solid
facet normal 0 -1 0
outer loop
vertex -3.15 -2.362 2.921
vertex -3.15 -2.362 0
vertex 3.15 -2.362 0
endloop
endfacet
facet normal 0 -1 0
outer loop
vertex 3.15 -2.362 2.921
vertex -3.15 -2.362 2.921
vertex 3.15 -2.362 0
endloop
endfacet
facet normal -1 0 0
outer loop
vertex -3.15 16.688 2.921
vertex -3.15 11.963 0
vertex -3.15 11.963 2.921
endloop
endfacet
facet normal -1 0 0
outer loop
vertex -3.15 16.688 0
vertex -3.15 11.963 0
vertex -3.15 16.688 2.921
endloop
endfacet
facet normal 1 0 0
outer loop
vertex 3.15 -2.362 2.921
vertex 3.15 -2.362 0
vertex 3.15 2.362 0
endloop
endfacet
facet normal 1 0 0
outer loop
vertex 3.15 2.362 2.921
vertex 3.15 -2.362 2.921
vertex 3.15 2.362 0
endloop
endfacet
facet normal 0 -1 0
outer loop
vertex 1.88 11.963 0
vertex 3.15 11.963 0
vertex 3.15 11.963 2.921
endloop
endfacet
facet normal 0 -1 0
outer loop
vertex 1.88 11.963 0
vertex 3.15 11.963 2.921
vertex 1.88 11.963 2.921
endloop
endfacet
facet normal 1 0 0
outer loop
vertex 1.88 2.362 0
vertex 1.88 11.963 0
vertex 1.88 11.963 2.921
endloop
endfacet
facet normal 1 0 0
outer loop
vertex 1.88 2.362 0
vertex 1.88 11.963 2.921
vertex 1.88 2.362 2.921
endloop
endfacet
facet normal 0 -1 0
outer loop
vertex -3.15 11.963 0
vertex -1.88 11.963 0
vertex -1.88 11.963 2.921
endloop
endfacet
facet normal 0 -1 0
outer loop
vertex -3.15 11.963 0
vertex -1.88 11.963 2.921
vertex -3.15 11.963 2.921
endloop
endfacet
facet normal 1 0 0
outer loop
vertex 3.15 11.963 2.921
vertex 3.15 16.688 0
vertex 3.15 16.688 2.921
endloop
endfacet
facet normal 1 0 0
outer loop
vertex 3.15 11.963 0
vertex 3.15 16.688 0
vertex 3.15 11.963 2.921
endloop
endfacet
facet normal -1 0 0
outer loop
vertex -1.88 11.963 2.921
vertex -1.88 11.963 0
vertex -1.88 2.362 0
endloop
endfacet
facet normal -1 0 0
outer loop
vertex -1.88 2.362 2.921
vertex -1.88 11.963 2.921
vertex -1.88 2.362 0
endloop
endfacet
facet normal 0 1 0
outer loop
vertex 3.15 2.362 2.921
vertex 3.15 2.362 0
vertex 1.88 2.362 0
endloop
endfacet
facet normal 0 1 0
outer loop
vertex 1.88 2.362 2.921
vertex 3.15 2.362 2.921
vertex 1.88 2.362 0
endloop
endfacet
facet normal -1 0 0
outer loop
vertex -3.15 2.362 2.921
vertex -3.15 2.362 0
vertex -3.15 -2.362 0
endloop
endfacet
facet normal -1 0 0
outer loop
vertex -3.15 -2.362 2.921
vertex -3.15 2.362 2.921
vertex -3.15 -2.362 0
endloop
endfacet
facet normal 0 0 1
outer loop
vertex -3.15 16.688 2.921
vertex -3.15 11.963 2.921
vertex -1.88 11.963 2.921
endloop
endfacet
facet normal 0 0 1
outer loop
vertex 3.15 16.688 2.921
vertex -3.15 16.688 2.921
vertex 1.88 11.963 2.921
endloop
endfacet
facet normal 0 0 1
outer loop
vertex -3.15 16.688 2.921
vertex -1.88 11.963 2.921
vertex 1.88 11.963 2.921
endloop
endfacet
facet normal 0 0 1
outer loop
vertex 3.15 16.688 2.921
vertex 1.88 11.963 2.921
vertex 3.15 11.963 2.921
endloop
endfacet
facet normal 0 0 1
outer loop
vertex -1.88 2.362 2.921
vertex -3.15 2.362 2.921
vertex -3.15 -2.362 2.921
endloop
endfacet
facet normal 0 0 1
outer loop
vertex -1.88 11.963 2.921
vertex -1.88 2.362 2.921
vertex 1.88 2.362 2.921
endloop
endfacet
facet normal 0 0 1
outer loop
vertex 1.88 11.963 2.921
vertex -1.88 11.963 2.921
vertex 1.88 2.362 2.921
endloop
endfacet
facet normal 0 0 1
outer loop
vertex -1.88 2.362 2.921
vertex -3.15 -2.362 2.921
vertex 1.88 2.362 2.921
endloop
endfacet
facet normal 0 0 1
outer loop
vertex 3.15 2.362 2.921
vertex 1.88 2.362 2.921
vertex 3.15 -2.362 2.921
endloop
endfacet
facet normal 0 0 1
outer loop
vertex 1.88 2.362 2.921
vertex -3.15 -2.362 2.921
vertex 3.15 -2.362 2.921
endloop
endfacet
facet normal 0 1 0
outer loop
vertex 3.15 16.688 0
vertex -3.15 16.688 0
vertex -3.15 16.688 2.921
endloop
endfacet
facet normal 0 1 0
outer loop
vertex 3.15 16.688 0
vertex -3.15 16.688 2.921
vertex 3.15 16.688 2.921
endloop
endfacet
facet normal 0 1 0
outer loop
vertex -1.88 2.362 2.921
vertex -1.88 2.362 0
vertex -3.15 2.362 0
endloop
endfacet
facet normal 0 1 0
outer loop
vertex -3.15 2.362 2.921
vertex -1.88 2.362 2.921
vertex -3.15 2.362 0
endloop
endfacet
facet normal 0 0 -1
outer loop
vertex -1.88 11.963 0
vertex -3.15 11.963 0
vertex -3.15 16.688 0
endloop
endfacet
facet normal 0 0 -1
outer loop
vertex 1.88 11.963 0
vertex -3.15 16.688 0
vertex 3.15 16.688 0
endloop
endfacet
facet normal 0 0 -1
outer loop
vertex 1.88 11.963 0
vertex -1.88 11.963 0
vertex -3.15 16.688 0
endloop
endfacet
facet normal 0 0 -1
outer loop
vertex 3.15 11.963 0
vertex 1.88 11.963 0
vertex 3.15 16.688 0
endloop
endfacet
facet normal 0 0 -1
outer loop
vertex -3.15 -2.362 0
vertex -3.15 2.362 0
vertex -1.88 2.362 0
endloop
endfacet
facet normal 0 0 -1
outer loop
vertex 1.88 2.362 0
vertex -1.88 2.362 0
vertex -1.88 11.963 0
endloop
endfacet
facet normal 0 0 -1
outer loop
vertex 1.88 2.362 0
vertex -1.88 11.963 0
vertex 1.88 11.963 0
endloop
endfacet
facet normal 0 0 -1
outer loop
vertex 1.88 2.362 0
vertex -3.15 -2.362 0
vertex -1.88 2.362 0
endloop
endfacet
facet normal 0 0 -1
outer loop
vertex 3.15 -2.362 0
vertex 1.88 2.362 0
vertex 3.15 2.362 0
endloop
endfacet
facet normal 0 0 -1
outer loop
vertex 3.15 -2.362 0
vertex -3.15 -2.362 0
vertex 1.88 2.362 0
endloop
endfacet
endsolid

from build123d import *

# Parameters (mm, degrees)
F0_W     = 1.8796
F0_H     = 4.8006
F1_DEPTH = 2.921


with BuildPart() as f1:
    # F0 (on Top) → F1 (new body)
    with BuildSketch(Plane.XY):
        Polygon((3.1496, -2.3622), (3.1496, 2.3622), (1.8796, 2.3622), (0, 2.3622), (-1.8796, 2.3622), (-3.1496, 2.3622), (-3.1496, -2.3622), align=None)
        with Locations((0.9398, 4.7625)):
            Rectangle(F0_W, F0_H)
        with Locations((-0.9398, 4.7625)):
            Rectangle(F0_W, F0_H)
    extrude(amount=F1_DEPTH)

    # F2: F1 across face


with BuildPart() as f1_1:
    add(f1.part)
    add(f1.part.mirror(Plane(origin=(0, 7.1628, 1.4605), x_dir=(-1, 0, 0), z_dir=(0, 1, 0))))


solid = f1_1.part
